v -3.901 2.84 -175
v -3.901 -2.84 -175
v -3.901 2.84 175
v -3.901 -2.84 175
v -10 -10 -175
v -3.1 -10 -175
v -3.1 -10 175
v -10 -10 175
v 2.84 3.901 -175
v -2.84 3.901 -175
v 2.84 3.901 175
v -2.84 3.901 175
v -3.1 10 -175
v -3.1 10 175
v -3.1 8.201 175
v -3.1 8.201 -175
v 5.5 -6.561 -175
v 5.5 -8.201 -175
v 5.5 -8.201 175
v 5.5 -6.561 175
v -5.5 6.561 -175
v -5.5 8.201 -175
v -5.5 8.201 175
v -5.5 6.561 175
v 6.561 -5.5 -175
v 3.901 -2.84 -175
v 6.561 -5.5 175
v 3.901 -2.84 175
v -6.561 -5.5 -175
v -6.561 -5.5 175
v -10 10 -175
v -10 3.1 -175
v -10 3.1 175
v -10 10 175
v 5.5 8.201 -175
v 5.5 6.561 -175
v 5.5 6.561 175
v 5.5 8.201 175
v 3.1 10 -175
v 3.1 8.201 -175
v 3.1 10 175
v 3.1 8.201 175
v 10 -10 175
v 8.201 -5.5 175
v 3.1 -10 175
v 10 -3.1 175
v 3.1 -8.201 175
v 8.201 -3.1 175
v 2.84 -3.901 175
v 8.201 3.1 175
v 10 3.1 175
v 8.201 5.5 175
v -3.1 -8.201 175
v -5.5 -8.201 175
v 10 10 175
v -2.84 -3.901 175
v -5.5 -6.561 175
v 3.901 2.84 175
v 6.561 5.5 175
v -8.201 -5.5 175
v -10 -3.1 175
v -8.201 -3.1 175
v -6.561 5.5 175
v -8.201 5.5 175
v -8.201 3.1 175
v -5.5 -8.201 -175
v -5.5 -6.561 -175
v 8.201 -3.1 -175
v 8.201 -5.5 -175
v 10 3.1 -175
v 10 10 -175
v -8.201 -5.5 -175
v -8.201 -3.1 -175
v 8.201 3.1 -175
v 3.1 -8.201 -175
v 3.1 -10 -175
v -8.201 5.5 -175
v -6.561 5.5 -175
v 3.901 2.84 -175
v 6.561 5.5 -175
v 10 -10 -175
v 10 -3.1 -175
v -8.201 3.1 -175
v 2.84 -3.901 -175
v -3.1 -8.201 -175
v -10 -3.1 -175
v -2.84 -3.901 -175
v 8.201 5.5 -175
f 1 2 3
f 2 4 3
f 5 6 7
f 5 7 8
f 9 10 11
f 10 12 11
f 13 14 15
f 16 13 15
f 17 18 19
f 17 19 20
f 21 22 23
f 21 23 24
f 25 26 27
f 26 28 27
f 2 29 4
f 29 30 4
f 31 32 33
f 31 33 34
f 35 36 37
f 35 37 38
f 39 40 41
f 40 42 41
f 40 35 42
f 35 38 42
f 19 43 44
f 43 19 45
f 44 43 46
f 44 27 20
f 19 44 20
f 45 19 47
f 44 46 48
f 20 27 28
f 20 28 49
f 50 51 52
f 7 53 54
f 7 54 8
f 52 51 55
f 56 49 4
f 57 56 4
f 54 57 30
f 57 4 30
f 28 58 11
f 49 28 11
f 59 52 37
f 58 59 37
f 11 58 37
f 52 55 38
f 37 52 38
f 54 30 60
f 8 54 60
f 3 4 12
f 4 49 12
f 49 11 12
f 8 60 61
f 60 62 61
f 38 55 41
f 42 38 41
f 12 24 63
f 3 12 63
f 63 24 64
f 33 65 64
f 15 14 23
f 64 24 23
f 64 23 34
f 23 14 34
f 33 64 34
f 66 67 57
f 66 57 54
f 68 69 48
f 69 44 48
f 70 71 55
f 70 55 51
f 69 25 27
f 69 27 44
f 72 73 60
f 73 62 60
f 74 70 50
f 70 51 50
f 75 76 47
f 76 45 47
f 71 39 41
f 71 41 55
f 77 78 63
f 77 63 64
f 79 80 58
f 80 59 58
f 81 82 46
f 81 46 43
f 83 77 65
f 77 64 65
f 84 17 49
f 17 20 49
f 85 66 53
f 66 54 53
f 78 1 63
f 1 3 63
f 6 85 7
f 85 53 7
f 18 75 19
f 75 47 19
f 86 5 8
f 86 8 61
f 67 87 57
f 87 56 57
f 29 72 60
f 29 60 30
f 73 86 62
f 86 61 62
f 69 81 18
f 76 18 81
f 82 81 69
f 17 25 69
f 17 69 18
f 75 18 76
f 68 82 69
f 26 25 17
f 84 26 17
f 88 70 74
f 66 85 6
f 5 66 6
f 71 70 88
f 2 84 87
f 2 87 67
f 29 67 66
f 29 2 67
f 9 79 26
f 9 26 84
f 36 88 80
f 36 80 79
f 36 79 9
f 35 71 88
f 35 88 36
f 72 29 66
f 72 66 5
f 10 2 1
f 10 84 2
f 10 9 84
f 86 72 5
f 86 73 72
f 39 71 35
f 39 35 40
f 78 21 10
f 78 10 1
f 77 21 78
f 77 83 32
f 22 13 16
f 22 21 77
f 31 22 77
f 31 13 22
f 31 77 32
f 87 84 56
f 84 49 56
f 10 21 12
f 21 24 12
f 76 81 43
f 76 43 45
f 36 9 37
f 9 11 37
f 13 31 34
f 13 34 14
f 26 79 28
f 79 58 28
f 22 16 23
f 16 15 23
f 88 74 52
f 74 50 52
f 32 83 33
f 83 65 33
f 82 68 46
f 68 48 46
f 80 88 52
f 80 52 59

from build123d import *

# Parameters (mm, degrees)
BOSS_EXTRUDE1_DEPTH = 175


with BuildPart() as part:
    # Sketch1 → Boss-Extrude1 (new body, symmetric)
    with BuildSketch(Plane.XY):
        Polygon((-3.1, 10), (-3.1, 8.200660172), (-5.5, 8.200660172), (-5.5, 6.560660172), (-2.84, 3.900660172), (2.84, 3.900660172), (5.5, 6.560660172), (5.5, 8.200660172), (3.1, 8.200660172), (3.1, 10), (10, 10), (10, 3.1), (8.200660172, 3.1), (8.200660172, 5.5), (6.560660172, 5.5), (3.900660172, 2.84), (3.900660172, -2.84), (6.560660172, -5.5), (8.200660172, -5.5), (8.200660172, -3.1), (10, -3.1), (10, -10), (3.1, -10), (3.1, -8.200660172), (5.5, -8.200660172), (5.5, -6.560660172), (2.84, -3.900660172), (-2.84, -3.900660172), (-5.5, -6.560660172), (-5.5, -8.200660172), (-3.1, -8.200660172), (-3.1, -10), (-10, -10), (-10, -3.1), (-8.200660172, -3.1), (-8.200660172, -5.5), (-6.560660172, -5.5), (-3.900660172, -2.84), (-3.900660172, 2.84), (-6.560660172, 5.5), (-8.200660172, 5.5), (-8.200660172, 3.1), (-10, 3.1), (-10, 10), align=None)
    extrude(amount=BOSS_EXTRUDE1_DEPTH, both=True)


solid = part.part
